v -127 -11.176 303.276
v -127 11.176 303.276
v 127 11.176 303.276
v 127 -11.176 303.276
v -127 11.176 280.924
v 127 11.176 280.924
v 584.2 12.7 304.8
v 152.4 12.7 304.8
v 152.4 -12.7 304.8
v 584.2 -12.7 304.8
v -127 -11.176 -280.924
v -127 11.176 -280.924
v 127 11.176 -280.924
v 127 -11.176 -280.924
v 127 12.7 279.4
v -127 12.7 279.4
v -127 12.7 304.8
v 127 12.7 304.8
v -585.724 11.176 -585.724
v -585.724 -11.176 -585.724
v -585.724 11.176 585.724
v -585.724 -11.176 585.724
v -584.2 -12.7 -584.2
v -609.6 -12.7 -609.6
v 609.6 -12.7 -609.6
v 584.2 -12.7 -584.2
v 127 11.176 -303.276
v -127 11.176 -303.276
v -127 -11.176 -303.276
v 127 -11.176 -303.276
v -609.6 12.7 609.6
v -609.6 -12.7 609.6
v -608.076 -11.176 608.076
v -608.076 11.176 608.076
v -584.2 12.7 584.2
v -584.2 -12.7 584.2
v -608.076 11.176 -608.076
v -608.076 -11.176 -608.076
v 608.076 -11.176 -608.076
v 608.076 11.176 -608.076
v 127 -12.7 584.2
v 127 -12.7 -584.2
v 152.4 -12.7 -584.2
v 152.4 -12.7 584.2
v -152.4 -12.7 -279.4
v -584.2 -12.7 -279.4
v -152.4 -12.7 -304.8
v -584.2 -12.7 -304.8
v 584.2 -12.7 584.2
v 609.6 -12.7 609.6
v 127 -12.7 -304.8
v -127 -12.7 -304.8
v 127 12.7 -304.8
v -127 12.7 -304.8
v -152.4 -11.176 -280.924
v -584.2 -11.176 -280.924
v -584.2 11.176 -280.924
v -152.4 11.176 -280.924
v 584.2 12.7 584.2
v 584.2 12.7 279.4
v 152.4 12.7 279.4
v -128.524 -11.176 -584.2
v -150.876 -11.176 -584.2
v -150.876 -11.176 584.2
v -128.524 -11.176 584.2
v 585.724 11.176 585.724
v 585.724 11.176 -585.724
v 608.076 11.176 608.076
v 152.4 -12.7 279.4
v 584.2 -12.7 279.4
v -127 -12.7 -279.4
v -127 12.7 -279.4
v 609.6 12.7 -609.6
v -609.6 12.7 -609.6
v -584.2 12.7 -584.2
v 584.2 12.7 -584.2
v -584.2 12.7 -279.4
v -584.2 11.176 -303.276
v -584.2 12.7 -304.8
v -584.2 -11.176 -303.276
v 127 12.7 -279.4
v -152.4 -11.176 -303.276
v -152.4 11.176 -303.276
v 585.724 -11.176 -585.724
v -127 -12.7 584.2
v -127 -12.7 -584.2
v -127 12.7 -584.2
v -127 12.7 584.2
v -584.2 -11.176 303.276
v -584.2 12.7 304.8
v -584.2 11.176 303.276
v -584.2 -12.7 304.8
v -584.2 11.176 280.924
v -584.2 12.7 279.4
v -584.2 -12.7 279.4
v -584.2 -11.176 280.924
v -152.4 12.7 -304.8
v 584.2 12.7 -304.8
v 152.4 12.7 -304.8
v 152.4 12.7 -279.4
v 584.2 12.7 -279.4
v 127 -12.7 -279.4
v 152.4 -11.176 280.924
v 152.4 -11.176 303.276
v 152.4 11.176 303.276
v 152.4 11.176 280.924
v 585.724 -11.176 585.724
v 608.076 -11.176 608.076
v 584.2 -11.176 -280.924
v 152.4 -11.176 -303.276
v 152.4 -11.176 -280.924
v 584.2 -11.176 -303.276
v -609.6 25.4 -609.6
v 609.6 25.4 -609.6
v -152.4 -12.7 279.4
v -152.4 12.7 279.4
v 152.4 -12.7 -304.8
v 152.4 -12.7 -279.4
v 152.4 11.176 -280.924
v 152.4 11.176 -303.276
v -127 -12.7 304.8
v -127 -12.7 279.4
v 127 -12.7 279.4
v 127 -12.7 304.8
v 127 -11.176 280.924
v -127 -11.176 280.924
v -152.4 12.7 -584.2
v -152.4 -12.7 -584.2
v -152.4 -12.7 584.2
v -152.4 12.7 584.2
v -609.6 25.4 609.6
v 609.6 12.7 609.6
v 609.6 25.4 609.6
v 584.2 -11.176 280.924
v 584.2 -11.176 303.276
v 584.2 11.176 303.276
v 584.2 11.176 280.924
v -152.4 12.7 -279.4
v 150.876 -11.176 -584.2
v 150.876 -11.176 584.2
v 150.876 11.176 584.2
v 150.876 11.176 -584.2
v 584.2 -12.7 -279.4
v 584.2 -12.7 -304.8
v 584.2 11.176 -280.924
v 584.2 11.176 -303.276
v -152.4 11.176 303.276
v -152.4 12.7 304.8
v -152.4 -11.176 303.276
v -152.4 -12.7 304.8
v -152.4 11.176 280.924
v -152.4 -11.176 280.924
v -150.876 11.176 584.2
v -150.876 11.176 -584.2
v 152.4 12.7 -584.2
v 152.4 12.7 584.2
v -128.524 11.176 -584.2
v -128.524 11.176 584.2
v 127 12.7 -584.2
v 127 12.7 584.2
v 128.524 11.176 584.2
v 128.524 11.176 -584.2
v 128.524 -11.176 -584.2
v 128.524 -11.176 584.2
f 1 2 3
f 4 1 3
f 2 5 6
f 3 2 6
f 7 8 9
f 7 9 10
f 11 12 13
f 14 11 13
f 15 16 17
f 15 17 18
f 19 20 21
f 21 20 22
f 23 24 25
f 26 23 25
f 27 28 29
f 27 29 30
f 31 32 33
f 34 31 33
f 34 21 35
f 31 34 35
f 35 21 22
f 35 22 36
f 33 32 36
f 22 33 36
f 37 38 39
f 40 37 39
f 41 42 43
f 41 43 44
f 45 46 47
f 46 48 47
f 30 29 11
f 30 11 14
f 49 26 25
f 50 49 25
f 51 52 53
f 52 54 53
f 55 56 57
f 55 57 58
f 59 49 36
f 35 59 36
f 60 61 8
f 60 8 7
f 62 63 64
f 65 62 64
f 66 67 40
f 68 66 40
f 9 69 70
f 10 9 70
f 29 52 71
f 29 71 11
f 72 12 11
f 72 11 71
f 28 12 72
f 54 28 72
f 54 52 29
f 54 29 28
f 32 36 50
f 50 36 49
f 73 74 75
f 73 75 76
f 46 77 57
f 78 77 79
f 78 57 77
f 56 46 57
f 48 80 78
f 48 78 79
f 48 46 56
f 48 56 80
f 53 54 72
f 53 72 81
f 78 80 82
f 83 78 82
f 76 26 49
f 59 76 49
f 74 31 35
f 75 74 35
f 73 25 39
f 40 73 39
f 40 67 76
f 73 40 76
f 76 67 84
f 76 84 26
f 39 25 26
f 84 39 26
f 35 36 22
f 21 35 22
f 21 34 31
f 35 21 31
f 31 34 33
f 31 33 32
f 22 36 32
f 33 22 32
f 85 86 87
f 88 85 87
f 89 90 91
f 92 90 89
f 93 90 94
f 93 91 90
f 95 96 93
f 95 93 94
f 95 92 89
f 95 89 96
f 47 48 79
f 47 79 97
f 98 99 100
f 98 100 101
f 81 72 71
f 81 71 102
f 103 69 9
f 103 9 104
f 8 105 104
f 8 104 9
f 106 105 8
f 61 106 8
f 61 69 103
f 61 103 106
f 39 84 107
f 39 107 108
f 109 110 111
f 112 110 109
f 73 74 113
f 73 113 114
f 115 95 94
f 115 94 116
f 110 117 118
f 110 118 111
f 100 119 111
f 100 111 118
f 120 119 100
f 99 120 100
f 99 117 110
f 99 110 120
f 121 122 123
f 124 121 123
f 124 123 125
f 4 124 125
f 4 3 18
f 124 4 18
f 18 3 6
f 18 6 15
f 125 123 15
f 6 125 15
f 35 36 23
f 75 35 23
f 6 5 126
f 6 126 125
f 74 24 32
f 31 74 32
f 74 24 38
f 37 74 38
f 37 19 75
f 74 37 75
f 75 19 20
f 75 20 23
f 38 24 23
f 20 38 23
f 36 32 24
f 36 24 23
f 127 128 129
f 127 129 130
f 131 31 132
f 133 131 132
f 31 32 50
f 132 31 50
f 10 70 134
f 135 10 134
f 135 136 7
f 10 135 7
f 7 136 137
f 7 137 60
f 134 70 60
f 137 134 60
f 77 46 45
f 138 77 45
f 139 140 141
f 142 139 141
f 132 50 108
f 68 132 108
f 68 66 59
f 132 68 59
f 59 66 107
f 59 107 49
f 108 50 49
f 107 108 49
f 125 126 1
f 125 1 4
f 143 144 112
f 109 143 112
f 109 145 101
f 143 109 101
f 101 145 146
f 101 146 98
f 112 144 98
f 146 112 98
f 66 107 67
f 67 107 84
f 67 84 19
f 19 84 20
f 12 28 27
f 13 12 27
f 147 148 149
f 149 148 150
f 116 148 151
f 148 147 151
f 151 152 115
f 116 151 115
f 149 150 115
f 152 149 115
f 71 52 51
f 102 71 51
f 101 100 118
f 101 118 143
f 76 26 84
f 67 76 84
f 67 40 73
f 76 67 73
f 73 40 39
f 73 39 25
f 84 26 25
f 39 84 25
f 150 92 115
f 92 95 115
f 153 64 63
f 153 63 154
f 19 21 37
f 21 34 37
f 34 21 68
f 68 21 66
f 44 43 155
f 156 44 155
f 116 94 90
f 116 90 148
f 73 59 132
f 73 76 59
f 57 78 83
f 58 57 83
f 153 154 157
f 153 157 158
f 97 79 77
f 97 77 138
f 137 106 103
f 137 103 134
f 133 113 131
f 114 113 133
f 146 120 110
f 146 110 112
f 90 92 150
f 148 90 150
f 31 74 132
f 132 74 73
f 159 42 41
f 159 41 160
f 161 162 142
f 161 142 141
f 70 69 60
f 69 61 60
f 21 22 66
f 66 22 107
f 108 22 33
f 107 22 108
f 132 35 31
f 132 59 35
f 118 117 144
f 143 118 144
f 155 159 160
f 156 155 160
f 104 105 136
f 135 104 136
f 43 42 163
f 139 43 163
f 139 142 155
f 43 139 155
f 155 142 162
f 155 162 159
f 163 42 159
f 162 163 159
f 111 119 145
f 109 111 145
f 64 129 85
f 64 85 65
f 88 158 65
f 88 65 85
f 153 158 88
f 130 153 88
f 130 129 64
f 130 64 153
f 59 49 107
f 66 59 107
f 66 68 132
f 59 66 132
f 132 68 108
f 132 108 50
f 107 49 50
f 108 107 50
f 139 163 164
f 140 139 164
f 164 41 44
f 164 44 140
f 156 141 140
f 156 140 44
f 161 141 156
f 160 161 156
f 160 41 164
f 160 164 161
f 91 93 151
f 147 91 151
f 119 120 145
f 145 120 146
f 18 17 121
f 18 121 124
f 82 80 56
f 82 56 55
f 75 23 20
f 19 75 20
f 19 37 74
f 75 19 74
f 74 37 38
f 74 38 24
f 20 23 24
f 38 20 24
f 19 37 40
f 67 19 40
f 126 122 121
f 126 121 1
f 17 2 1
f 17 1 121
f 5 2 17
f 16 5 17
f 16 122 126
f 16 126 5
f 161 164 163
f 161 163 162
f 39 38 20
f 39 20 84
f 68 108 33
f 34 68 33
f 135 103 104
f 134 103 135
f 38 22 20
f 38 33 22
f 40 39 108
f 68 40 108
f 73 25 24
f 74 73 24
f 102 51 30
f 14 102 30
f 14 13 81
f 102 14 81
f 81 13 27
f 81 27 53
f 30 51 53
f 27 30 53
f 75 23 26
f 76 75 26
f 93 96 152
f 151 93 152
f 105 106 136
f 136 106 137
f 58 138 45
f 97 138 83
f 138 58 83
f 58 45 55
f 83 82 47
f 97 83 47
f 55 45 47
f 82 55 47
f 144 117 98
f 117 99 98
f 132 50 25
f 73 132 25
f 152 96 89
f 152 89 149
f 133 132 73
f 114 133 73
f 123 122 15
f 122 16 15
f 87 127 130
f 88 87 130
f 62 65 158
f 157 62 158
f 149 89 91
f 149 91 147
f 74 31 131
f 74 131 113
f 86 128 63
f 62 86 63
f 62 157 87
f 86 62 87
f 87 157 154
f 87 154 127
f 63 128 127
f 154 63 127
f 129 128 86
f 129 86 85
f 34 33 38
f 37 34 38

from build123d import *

# Parameters (mm, degrees)
RECTANGULAR_START                         = -152.4
RECTANGULAR_TUBE_1X1X0_060_1_OUTLINE_W    = 1.524
RECTANGULAR_TUBE_1X1X0_060_1_OUTLINE_H    = 1168.4
RECTANGULAR_TUBE_1X1X0_060_1_DEPTH        = 25.4
RECTANGULAR_TUBE_1X1X0_060_1_2_OUTLINE_W  = 22.352
RECTANGULAR_TUBE_1X1X0_060_1_2_OUTLINE_H  = 1168.4
RECTANGULAR_TUBE_1X1X0_060_1_2_DEPTH      = 1.524
RECTANGULAR_START_2                       = -128.524
RECTANGULAR_TUBE_1X1X0_060_1_3_OUTLINE_W  = 22.352
RECTANGULAR_TUBE_1X1X0_060_1_3_OUTLINE_H  = 1168.4
RECTANGULAR_TUBE_1X1X0_060_1_3_DEPTH      = 1.524
RECTANGULAR_START_3                       = 127
RECTANGULAR_TUBE_1X1X0_060_1_4_OUTLINE_W  = 1.524
RECTANGULAR_TUBE_1X1X0_060_1_4_OUTLINE_H  = 1168.4
RECTANGULAR_TUBE_1X1X0_060_1_4_DEPTH      = 25.4
RECTANGULAR_TUBE_1X1X0_060_1_5_OUTLINE_W  = 22.352
RECTANGULAR_TUBE_1X1X0_060_1_5_OUTLINE_H  = 1168.4
RECTANGULAR_TUBE_1X1X0_060_1_5_DEPTH      = 1.524
RECTANGULAR_START_4                       = 150.876
RECTANGULAR_TUBE_1X1X0_060_1_6_OUTLINE_W  = 22.352
RECTANGULAR_TUBE_1X1X0_060_1_6_OUTLINE_H  = 1168.4
RECTANGULAR_TUBE_1X1X0_060_1_6_DEPTH      = 1.524
RECTANGULAR_START_5                       = -12.7
RECTANGULAR_TUBE_1X1X0_060_1_7_DEPTH      = 25.4
RECTANGULAR_TUBE_1X1X0_060_1_8_DEPTH      = 1.524
RECTANGULAR_START_6                       = 11.176
RECTANGULAR_TUBE_1X1X0_060_1_9_DEPTH      = 1.524
RECTANGULAR_TUBE_1X1X0_060_1_10_DEPTH     = 25.4
RECTANGULAR_TUBE_1X1X0_060_1_11_DEPTH     = 1.524
RECTANGULAR_TUBE_1X1X0_060_1_12_DEPTH     = 1.524
RECTANGULAR_TUBE_1X1X0_060_1_13_DEPTH     = 25.4
RECTANGULAR_TUBE_1X1X0_060_1_14_DEPTH     = 1.524
RECTANGULAR_TUBE_1X1X0_060_1_15_DEPTH     = 1.524
RECTANGULAR_TUBE_1X1X0_060_1_16_DEPTH     = 25.4
RECTANGULAR_TUBE_1X1X0_060_1_17_DEPTH     = 1.524
RECTANGULAR_TUBE_1X1X0_060_1_18_DEPTH     = 1.524
RECTANGULAR_START_7                       = -304.8
RECTANGULAR_TUBE_1X1X0_060_1_19_OUTLINE_W = 431.8
RECTANGULAR_TUBE_1X1X0_060_1_19_OUTLINE_H = 1.524
RECTANGULAR_TUBE_1X1X0_060_1_19_DEPTH     = 25.4
RECTANGULAR_TUBE_1X1X0_060_1_20_OUTLINE_W = 431.8
RECTANGULAR_TUBE_1X1X0_060_1_20_OUTLINE_H = 22.352
RECTANGULAR_TUBE_1X1X0_060_1_20_DEPTH     = 1.524
RECTANGULAR_START_8                       = -280.924
RECTANGULAR_TUBE_1X1X0_060_1_21_OUTLINE_W = 431.8
RECTANGULAR_TUBE_1X1X0_060_1_21_OUTLINE_H = 22.352
RECTANGULAR_TUBE_1X1X0_060_1_21_DEPTH     = 1.524
RECTANGULAR_TUBE_1X1X0_060_1_22_OUTLINE_W = 431.8
RECTANGULAR_TUBE_1X1X0_060_1_22_OUTLINE_H = 1.524
RECTANGULAR_TUBE_1X1X0_060_1_22_DEPTH     = 25.4
RECTANGULAR_TUBE_1X1X0_060_1_23_OUTLINE_W = 431.8
RECTANGULAR_TUBE_1X1X0_060_1_23_OUTLINE_H = 22.352
RECTANGULAR_TUBE_1X1X0_060_1_23_DEPTH     = 1.524
RECTANGULAR_TUBE_1X1X0_060_1_24_OUTLINE_W = 431.8
RECTANGULAR_TUBE_1X1X0_060_1_24_OUTLINE_H = 22.352
RECTANGULAR_TUBE_1X1X0_060_1_24_DEPTH     = 1.524
RECTANGULAR_TUBE_1X1X0_060_1_25_OUTLINE_W = 254
RECTANGULAR_TUBE_1X1X0_060_1_25_OUTLINE_H = 1.524
RECTANGULAR_TUBE_1X1X0_060_1_25_DEPTH     = 25.4
RECTANGULAR_TUBE_1X1X0_060_1_26_OUTLINE_W = 254
RECTANGULAR_TUBE_1X1X0_060_1_26_OUTLINE_H = 22.352
RECTANGULAR_TUBE_1X1X0_060_1_26_DEPTH     = 1.524
RECTANGULAR_TUBE_1X1X0_060_1_27_OUTLINE_W = 254
RECTANGULAR_TUBE_1X1X0_060_1_27_OUTLINE_H = 22.352
RECTANGULAR_TUBE_1X1X0_060_1_27_DEPTH     = 1.524
RECTANGULAR_START_9                       = 279.4
RECTANGULAR_TUBE_1X1X0_060_1_28_OUTLINE_W = 431.8
RECTANGULAR_TUBE_1X1X0_060_1_28_OUTLINE_H = 1.524
RECTANGULAR_TUBE_1X1X0_060_1_28_DEPTH     = 25.4
RECTANGULAR_TUBE_1X1X0_060_1_29_OUTLINE_W = 431.8
RECTANGULAR_TUBE_1X1X0_060_1_29_OUTLINE_H = 22.352
RECTANGULAR_TUBE_1X1X0_060_1_29_DEPTH     = 1.524
RECTANGULAR_START_10                      = 303.276
RECTANGULAR_TUBE_1X1X0_060_1_30_OUTLINE_W = 431.8
RECTANGULAR_TUBE_1X1X0_060_1_30_OUTLINE_H = 22.352
RECTANGULAR_TUBE_1X1X0_060_1_30_DEPTH     = 1.524
RECTANGULAR_TUBE_1X1X0_060_1_31_OUTLINE_W = 431.8
RECTANGULAR_TUBE_1X1X0_060_1_31_OUTLINE_H = 1.524
RECTANGULAR_TUBE_1X1X0_060_1_31_DEPTH     = 25.4
RECTANGULAR_TUBE_1X1X0_060_1_32_OUTLINE_W = 431.8
RECTANGULAR_TUBE_1X1X0_060_1_32_OUTLINE_H = 22.352
RECTANGULAR_TUBE_1X1X0_060_1_32_DEPTH     = 1.524
RECTANGULAR_TUBE_1X1X0_060_1_33_OUTLINE_W = 431.8
RECTANGULAR_TUBE_1X1X0_060_1_33_OUTLINE_H = 22.352
RECTANGULAR_TUBE_1X1X0_060_1_33_DEPTH     = 1.524
RECTANGULAR_TUBE_1X1X0_060_1_34_OUTLINE_W = 254
RECTANGULAR_TUBE_1X1X0_060_1_34_OUTLINE_H = 1.524
RECTANGULAR_TUBE_1X1X0_060_1_34_DEPTH     = 25.4
RECTANGULAR_TUBE_1X1X0_060_1_35_OUTLINE_W = 254
RECTANGULAR_TUBE_1X1X0_060_1_35_OUTLINE_H = 22.352
RECTANGULAR_TUBE_1X1X0_060_1_35_DEPTH     = 1.524
RECTANGULAR_TUBE_1X1X0_060_1_36_OUTLINE_W = 254
RECTANGULAR_TUBE_1X1X0_060_1_36_OUTLINE_H = 22.352
RECTANGULAR_TUBE_1X1X0_060_1_36_DEPTH     = 1.524
SKETCH3_W                                 = 1219.2
SKETCH3_H                                 = 1219.2
BOSS_EXTRUDE1_DEPTH                       = 12.7


# Read off the part's stored shape, not the designer's step: Rectangular tube 1X1X0_060(1)
with BuildPart() as part:
    # Rectangular tube 1X1X0_060(1) outline → Rectangular tube 1X1X0_060(1) (new body)
    with BuildSketch(Plane.YZ.offset(RECTANGULAR_START)):
        with Locations((11.938, 0)):
            Rectangle(RECTANGULAR_TUBE_1X1X0_060_1_OUTLINE_W, RECTANGULAR_TUBE_1X1X0_060_1_OUTLINE_H)
        with Locations((-11.938, 0)):
            Rectangle(RECTANGULAR_TUBE_1X1X0_060_1_OUTLINE_W, RECTANGULAR_TUBE_1X1X0_060_1_OUTLINE_H)
    extrude(amount=RECTANGULAR_TUBE_1X1X0_060_1_DEPTH)

    # Rectangular tube 1X1X0_060_1 2 outline → Rectangular tube 1X1X0_060_1 2 (add)
    with BuildSketch(Plane.YZ.offset(RECTANGULAR_START)):
        Rectangle(RECTANGULAR_TUBE_1X1X0_060_1_2_OUTLINE_W, RECTANGULAR_TUBE_1X1X0_060_1_2_OUTLINE_H)
    extrude(amount=RECTANGULAR_TUBE_1X1X0_060_1_2_DEPTH)

    # Rectangular tube 1X1X0_060_1 3 outline → Rectangular tube 1X1X0_060_1 3 (add)
    with BuildSketch(Plane.YZ.offset(RECTANGULAR_START_2)):
        Rectangle(RECTANGULAR_TUBE_1X1X0_060_1_3_OUTLINE_W, RECTANGULAR_TUBE_1X1X0_060_1_3_OUTLINE_H)
    extrude(amount=RECTANGULAR_TUBE_1X1X0_060_1_3_DEPTH)


with BuildPart() as body_2:
    # Rectangular tube 1X1X0_060_1 4 outline → Rectangular tube 1X1X0_060_1 4 (new body)
    with BuildSketch(Plane.YZ.offset(RECTANGULAR_START_3)):
        with Locations((11.938, 0)):
            Rectangle(RECTANGULAR_TUBE_1X1X0_060_1_4_OUTLINE_W, RECTANGULAR_TUBE_1X1X0_060_1_4_OUTLINE_H)
        with Locations((-11.938, 0)):
            Rectangle(RECTANGULAR_TUBE_1X1X0_060_1_4_OUTLINE_W, RECTANGULAR_TUBE_1X1X0_060_1_4_OUTLINE_H)
    extrude(amount=RECTANGULAR_TUBE_1X1X0_060_1_4_DEPTH)

    # Rectangular tube 1X1X0_060_1 5 outline → Rectangular tube 1X1X0_060_1 5 (add)
    with BuildSketch(Plane.YZ.offset(RECTANGULAR_START_3)):
        Rectangle(RECTANGULAR_TUBE_1X1X0_060_1_5_OUTLINE_W, RECTANGULAR_TUBE_1X1X0_060_1_5_OUTLINE_H)
    extrude(amount=RECTANGULAR_TUBE_1X1X0_060_1_5_DEPTH)

    # Rectangular tube 1X1X0_060_1 6 outline → Rectangular tube 1X1X0_060_1 6 (add)
    with BuildSketch(Plane.YZ.offset(RECTANGULAR_START_4)):
        Rectangle(RECTANGULAR_TUBE_1X1X0_060_1_6_OUTLINE_W, RECTANGULAR_TUBE_1X1X0_060_1_6_OUTLINE_H)
    extrude(amount=RECTANGULAR_TUBE_1X1X0_060_1_6_DEPTH)


with BuildPart() as body_3:
    # Rectangular tube 1X1X0_060_1 7 outline → Rectangular tube 1X1X0_060_1 7 (new body)
    with BuildSketch(Plane(origin=(0, 0, 0), x_dir=(1, 0, 0), z_dir=(0, 1, 0)).offset(RECTANGULAR_START_5)):
        Polygon((-584.2, -584.2), (-584.2, 584.2), (-585.724, 585.724), (-585.724, -585.724), align=None)
        Polygon((-608.076, -608.076), (-608.076, 608.076), (-609.6, 609.6), (-609.6, -609.6), align=None)
    extrude(amount=RECTANGULAR_TUBE_1X1X0_060_1_7_DEPTH)

    # Rectangular tube 1X1X0_060_1 8 outline → Rectangular tube 1X1X0_060_1 8 (add)
    with BuildSketch(Plane(origin=(0, 0, 0), x_dir=(1, 0, 0), z_dir=(0, 1, 0)).offset(RECTANGULAR_START_5)):
        Polygon((-585.724, -585.724), (-585.724, 585.724), (-608.076, 608.076), (-608.076, -608.076), align=None)
    extrude(amount=RECTANGULAR_TUBE_1X1X0_060_1_8_DEPTH)

    # Rectangular tube 1X1X0_060_1 9 outline → Rectangular tube 1X1X0_060_1 9 (add)
    with BuildSketch(Plane(origin=(0, 0, 0), x_dir=(1, 0, 0), z_dir=(0, 1, 0)).offset(RECTANGULAR_START_6)):
        Polygon((-585.724, -585.724), (-585.724, 585.724), (-608.076, 608.076), (-608.076, -608.076), align=None)
    extrude(amount=RECTANGULAR_TUBE_1X1X0_060_1_9_DEPTH)


with BuildPart() as body_4:
    # Rectangular tube 1X1X0_060_1 10 outline → Rectangular tube 1X1X0_060_1 10 (new body)
    with BuildSketch(Plane(origin=(0, 0, 0), x_dir=(1, 0, 0), z_dir=(0, 1, 0)).offset(RECTANGULAR_START_5)):
        Polygon((-584.2, 584.2), (584.2, 584.2), (585.724, 585.724), (-585.724, 585.724), align=None)
        Polygon((-608.076, 608.076), (608.076, 608.076), (609.6, 609.6), (-609.6, 609.6), align=None)
    extrude(amount=RECTANGULAR_TUBE_1X1X0_060_1_10_DEPTH)

    # Rectangular tube 1X1X0_060_1 11 outline → Rectangular tube 1X1X0_060_1 11 (add)
    with BuildSketch(Plane(origin=(0, 0, 0), x_dir=(1, 0, 0), z_dir=(0, 1, 0)).offset(RECTANGULAR_START_5)):
        Polygon((-585.724, 585.724), (585.724, 585.724), (608.076, 608.076), (-608.076, 608.076), align=None)
    extrude(amount=RECTANGULAR_TUBE_1X1X0_060_1_11_DEPTH)

    # Rectangular tube 1X1X0_060_1 12 outline → Rectangular tube 1X1X0_060_1 12 (add)
    with BuildSketch(Plane(origin=(0, 0, 0), x_dir=(1, 0, 0), z_dir=(0, 1, 0)).offset(RECTANGULAR_START_6)):
        Polygon((-585.724, 585.724), (585.724, 585.724), (608.076, 608.076), (-608.076, 608.076), align=None)
    extrude(amount=RECTANGULAR_TUBE_1X1X0_060_1_12_DEPTH)


with BuildPart() as body_5:
    # Rectangular tube 1X1X0_060_1 13 outline → Rectangular tube 1X1X0_060_1 13 (new body)
    with BuildSketch(Plane(origin=(0, 0, 0), x_dir=(1, 0, 0), z_dir=(0, 1, 0)).offset(RECTANGULAR_START_5)):
        Polygon((584.2, -584.2), (-584.2, -584.2), (-585.724, -585.724), (585.724, -585.724), align=None)
        Polygon((608.076, -608.076), (-608.076, -608.076), (-609.6, -609.6), (609.6, -609.6), align=None)
    extrude(amount=RECTANGULAR_TUBE_1X1X0_060_1_13_DEPTH)

    # Rectangular tube 1X1X0_060_1 14 outline → Rectangular tube 1X1X0_060_1 14 (add)
    with BuildSketch(Plane(origin=(0, 0, 0), x_dir=(1, 0, 0), z_dir=(0, 1, 0)).offset(RECTANGULAR_START_5)):
        Polygon((585.724, -585.724), (-585.724, -585.724), (-608.076, -608.076), (608.076, -608.076), align=None)
    extrude(amount=RECTANGULAR_TUBE_1X1X0_060_1_14_DEPTH)

    # Rectangular tube 1X1X0_060_1 15 outline → Rectangular tube 1X1X0_060_1 15 (add)
    with BuildSketch(Plane(origin=(0, 0, 0), x_dir=(1, 0, 0), z_dir=(0, 1, 0)).offset(RECTANGULAR_START_6)):
        Polygon((585.724, -585.724), (-585.724, -585.724), (-608.076, -608.076), (608.076, -608.076), align=None)
    extrude(amount=RECTANGULAR_TUBE_1X1X0_060_1_15_DEPTH)


with BuildPart() as body_6:
    # Rectangular tube 1X1X0_060_1 16 outline → Rectangular tube 1X1X0_060_1 16 (new body)
    with BuildSketch(Plane(origin=(0, 0, 0), x_dir=(1, 0, 0), z_dir=(0, 1, 0)).offset(RECTANGULAR_START_5)):
        Polygon((584.2, 584.2), (584.2, -584.2), (585.724, -585.724), (585.724, 585.724), align=None)
        Polygon((608.076, 608.076), (608.076, -608.076), (609.6, -609.6), (609.6, 609.6), align=None)
    extrude(amount=RECTANGULAR_TUBE_1X1X0_060_1_16_DEPTH)

    # Rectangular tube 1X1X0_060_1 17 outline → Rectangular tube 1X1X0_060_1 17 (add)
    with BuildSketch(Plane(origin=(0, 0, 0), x_dir=(1, 0, 0), z_dir=(0, 1, 0)).offset(RECTANGULAR_START_5)):
        Polygon((585.724, 585.724), (585.724, -585.724), (608.076, -608.076), (608.076, 608.076), align=None)
    extrude(amount=RECTANGULAR_TUBE_1X1X0_060_1_17_DEPTH)

    # Rectangular tube 1X1X0_060_1 18 outline → Rectangular tube 1X1X0_060_1 18 (add)
    with BuildSketch(Plane(origin=(0, 0, 0), x_dir=(1, 0, 0), z_dir=(0, 1, 0)).offset(RECTANGULAR_START_6)):
        Polygon((585.724, 585.724), (585.724, -585.724), (608.076, -608.076), (608.076, 608.076), align=None)
    extrude(amount=RECTANGULAR_TUBE_1X1X0_060_1_18_DEPTH)


with BuildPart() as body_7:
    # Rectangular tube 1X1X0_060_1 19 outline → Rectangular tube 1X1X0_060_1 19 (new body)
    with BuildSketch(Plane.XY.offset(RECTANGULAR_START_7)):
        with Locations((368.3, 11.938)):
            Rectangle(RECTANGULAR_TUBE_1X1X0_060_1_19_OUTLINE_W, RECTANGULAR_TUBE_1X1X0_060_1_19_OUTLINE_H)
        with Locations((368.3, -11.938)):
            Rectangle(RECTANGULAR_TUBE_1X1X0_060_1_19_OUTLINE_W, RECTANGULAR_TUBE_1X1X0_060_1_19_OUTLINE_H)
    extrude(amount=RECTANGULAR_TUBE_1X1X0_060_1_19_DEPTH)

    # Rectangular tube 1X1X0_060_1 20 outline → Rectangular tube 1X1X0_060_1 20 (add)
    with BuildSketch(Plane.XY.offset(RECTANGULAR_START_7)):
        with Locations((368.3, 0)):
            Rectangle(RECTANGULAR_TUBE_1X1X0_060_1_20_OUTLINE_W, RECTANGULAR_TUBE_1X1X0_060_1_20_OUTLINE_H)
    extrude(amount=RECTANGULAR_TUBE_1X1X0_060_1_20_DEPTH)

    # Rectangular tube 1X1X0_060_1 21 outline → Rectangular tube 1X1X0_060_1 21 (add)
    with BuildSketch(Plane.XY.offset(RECTANGULAR_START_8)):
        with Locations((368.3, 0)):
            Rectangle(RECTANGULAR_TUBE_1X1X0_060_1_21_OUTLINE_W, RECTANGULAR_TUBE_1X1X0_060_1_21_OUTLINE_H)
    extrude(amount=RECTANGULAR_TUBE_1X1X0_060_1_21_DEPTH)


with BuildPart() as body_8:
    # Rectangular tube 1X1X0_060_1 22 outline → Rectangular tube 1X1X0_060_1 22 (new body)
    with BuildSketch(Plane(origin=(0, 0, 0), x_dir=(1, 0, 0), z_dir=(0, 1, 0)).offset(RECTANGULAR_START_5)):
        with Locations((-368.3, 304.038)):
            Rectangle(RECTANGULAR_TUBE_1X1X0_060_1_22_OUTLINE_W, RECTANGULAR_TUBE_1X1X0_060_1_22_OUTLINE_H)
        with Locations((-368.3, 280.162)):
            Rectangle(RECTANGULAR_TUBE_1X1X0_060_1_22_OUTLINE_W, RECTANGULAR_TUBE_1X1X0_060_1_22_OUTLINE_H)
    extrude(amount=RECTANGULAR_TUBE_1X1X0_060_1_22_DEPTH)

    # Rectangular tube 1X1X0_060_1 23 outline → Rectangular tube 1X1X0_060_1 23 (add)
    with BuildSketch(Plane(origin=(0, 0, 0), x_dir=(1, 0, 0), z_dir=(0, 1, 0)).offset(RECTANGULAR_START_5)):
        with Locations((-368.3, 292.1)):
            Rectangle(RECTANGULAR_TUBE_1X1X0_060_1_23_OUTLINE_W, RECTANGULAR_TUBE_1X1X0_060_1_23_OUTLINE_H)
    extrude(amount=RECTANGULAR_TUBE_1X1X0_060_1_23_DEPTH)

    # Rectangular tube 1X1X0_060_1 24 outline → Rectangular tube 1X1X0_060_1 24 (add)
    with BuildSketch(Plane(origin=(0, 0, 0), x_dir=(1, 0, 0), z_dir=(0, 1, 0)).offset(RECTANGULAR_START_6)):
        with Locations((-368.3, 292.1)):
            Rectangle(RECTANGULAR_TUBE_1X1X0_060_1_24_OUTLINE_W, RECTANGULAR_TUBE_1X1X0_060_1_24_OUTLINE_H)
    extrude(amount=RECTANGULAR_TUBE_1X1X0_060_1_24_DEPTH)


with BuildPart() as body_9:
    # Rectangular tube 1X1X0_060_1 25 outline → Rectangular tube 1X1X0_060_1 25 (new body)
    with BuildSketch(Plane.XY.offset(RECTANGULAR_START_7)):
        with Locations((0, -11.938)):
            Rectangle(RECTANGULAR_TUBE_1X1X0_060_1_25_OUTLINE_W, RECTANGULAR_TUBE_1X1X0_060_1_25_OUTLINE_H)
        with Locations((0, 11.938)):
            Rectangle(RECTANGULAR_TUBE_1X1X0_060_1_25_OUTLINE_W, RECTANGULAR_TUBE_1X1X0_060_1_25_OUTLINE_H)
    extrude(amount=RECTANGULAR_TUBE_1X1X0_060_1_25_DEPTH)

    # Rectangular tube 1X1X0_060_1 26 outline → Rectangular tube 1X1X0_060_1 26 (add)
    with BuildSketch(Plane.XY.offset(RECTANGULAR_START_7)):
        Rectangle(RECTANGULAR_TUBE_1X1X0_060_1_26_OUTLINE_W, RECTANGULAR_TUBE_1X1X0_060_1_26_OUTLINE_H)
    extrude(amount=RECTANGULAR_TUBE_1X1X0_060_1_26_DEPTH)

    # Rectangular tube 1X1X0_060_1 27 outline → Rectangular tube 1X1X0_060_1 27 (add)
    with BuildSketch(Plane.XY.offset(RECTANGULAR_START_8)):
        Rectangle(RECTANGULAR_TUBE_1X1X0_060_1_27_OUTLINE_W, RECTANGULAR_TUBE_1X1X0_060_1_27_OUTLINE_H)
    extrude(amount=RECTANGULAR_TUBE_1X1X0_060_1_27_DEPTH)


with BuildPart() as body_10:
    # Rectangular tube 1X1X0_060_1 28 outline → Rectangular tube 1X1X0_060_1 28 (new body)
    with BuildSketch(Plane.XY.offset(RECTANGULAR_START_9)):
        with Locations((368.3, 11.938)):
            Rectangle(RECTANGULAR_TUBE_1X1X0_060_1_28_OUTLINE_W, RECTANGULAR_TUBE_1X1X0_060_1_28_OUTLINE_H)
        with Locations((368.3, -11.938)):
            Rectangle(RECTANGULAR_TUBE_1X1X0_060_1_28_OUTLINE_W, RECTANGULAR_TUBE_1X1X0_060_1_28_OUTLINE_H)
    extrude(amount=RECTANGULAR_TUBE_1X1X0_060_1_28_DEPTH)

    # Rectangular tube 1X1X0_060_1 29 outline → Rectangular tube 1X1X0_060_1 29 (add)
    with BuildSketch(Plane.XY.offset(RECTANGULAR_START_9)):
        with Locations((368.3, 0)):
            Rectangle(RECTANGULAR_TUBE_1X1X0_060_1_29_OUTLINE_W, RECTANGULAR_TUBE_1X1X0_060_1_29_OUTLINE_H)
    extrude(amount=RECTANGULAR_TUBE_1X1X0_060_1_29_DEPTH)

    # Rectangular tube 1X1X0_060_1 30 outline → Rectangular tube 1X1X0_060_1 30 (add)
    with BuildSketch(Plane.XY.offset(RECTANGULAR_START_10)):
        with Locations((368.3, 0)):
            Rectangle(RECTANGULAR_TUBE_1X1X0_060_1_30_OUTLINE_W, RECTANGULAR_TUBE_1X1X0_060_1_30_OUTLINE_H)
    extrude(amount=RECTANGULAR_TUBE_1X1X0_060_1_30_DEPTH)


with BuildPart() as body_11:
    # Rectangular tube 1X1X0_060_1 31 outline → Rectangular tube 1X1X0_060_1 31 (new body)
    with BuildSketch(Plane(origin=(0, 0, 0), x_dir=(1, 0, 0), z_dir=(0, 1, 0)).offset(RECTANGULAR_START_5)):
        with Locations((-368.3, -280.162)):
            Rectangle(RECTANGULAR_TUBE_1X1X0_060_1_31_OUTLINE_W, RECTANGULAR_TUBE_1X1X0_060_1_31_OUTLINE_H)
        with Locations((-368.3, -304.038)):
            Rectangle(RECTANGULAR_TUBE_1X1X0_060_1_31_OUTLINE_W, RECTANGULAR_TUBE_1X1X0_060_1_31_OUTLINE_H)
    extrude(amount=RECTANGULAR_TUBE_1X1X0_060_1_31_DEPTH)

    # Rectangular tube 1X1X0_060_1 32 outline → Rectangular tube 1X1X0_060_1 32 (add)
    with BuildSketch(Plane(origin=(0, 0, 0), x_dir=(1, 0, 0), z_dir=(0, 1, 0)).offset(RECTANGULAR_START_5)):
        with Locations((-368.3, -292.1)):
            Rectangle(RECTANGULAR_TUBE_1X1X0_060_1_32_OUTLINE_W, RECTANGULAR_TUBE_1X1X0_060_1_32_OUTLINE_H)
    extrude(amount=RECTANGULAR_TUBE_1X1X0_060_1_32_DEPTH)

    # Rectangular tube 1X1X0_060_1 33 outline → Rectangular tube 1X1X0_060_1 33 (add)
    with BuildSketch(Plane(origin=(0, 0, 0), x_dir=(1, 0, 0), z_dir=(0, 1, 0)).offset(RECTANGULAR_START_6)):
        with Locations((-368.3, -292.1)):
            Rectangle(RECTANGULAR_TUBE_1X1X0_060_1_33_OUTLINE_W, RECTANGULAR_TUBE_1X1X0_060_1_33_OUTLINE_H)
    extrude(amount=RECTANGULAR_TUBE_1X1X0_060_1_33_DEPTH)


with BuildPart() as body_12:
    # Rectangular tube 1X1X0_060_1 34 outline → Rectangular tube 1X1X0_060_1 34 (new body)
    with BuildSketch(Plane.XY.offset(RECTANGULAR_START_9)):
        with Locations((0, -11.938)):
            Rectangle(RECTANGULAR_TUBE_1X1X0_060_1_34_OUTLINE_W, RECTANGULAR_TUBE_1X1X0_060_1_34_OUTLINE_H)
        with Locations((0, 11.938)):
            Rectangle(RECTANGULAR_TUBE_1X1X0_060_1_34_OUTLINE_W, RECTANGULAR_TUBE_1X1X0_060_1_34_OUTLINE_H)
    extrude(amount=RECTANGULAR_TUBE_1X1X0_060_1_34_DEPTH)

    # Rectangular tube 1X1X0_060_1 35 outline → Rectangular tube 1X1X0_060_1 35 (add)
    with BuildSketch(Plane.XY.offset(RECTANGULAR_START_9)):
        Rectangle(RECTANGULAR_TUBE_1X1X0_060_1_35_OUTLINE_W, RECTANGULAR_TUBE_1X1X0_060_1_35_OUTLINE_H)
    extrude(amount=RECTANGULAR_TUBE_1X1X0_060_1_35_DEPTH)

    # Rectangular tube 1X1X0_060_1 36 outline → Rectangular tube 1X1X0_060_1 36 (add)
    with BuildSketch(Plane.XY.offset(RECTANGULAR_START_10)):
        Rectangle(RECTANGULAR_TUBE_1X1X0_060_1_36_OUTLINE_W, RECTANGULAR_TUBE_1X1X0_060_1_36_OUTLINE_H)
    extrude(amount=RECTANGULAR_TUBE_1X1X0_060_1_36_DEPTH)


with BuildPart() as body_13:
    # Sketch3 → Boss-Extrude1 (new body)
    with BuildSketch(Plane(origin=(0, 12.7, 0), x_dir=(1, 0, 0), z_dir=(0, 1, 0))):
        Rectangle(SKETCH3_W, SKETCH3_H)
    extrude(amount=BOSS_EXTRUDE1_DEPTH)


solid = Compound([part.part, body_2.part, body_3.part, body_4.part, body_5.part, body_6.part, body_7.part, body_8.part, body_9.part, body_10.part, body_11.part, body_12.part, body_13.part])
